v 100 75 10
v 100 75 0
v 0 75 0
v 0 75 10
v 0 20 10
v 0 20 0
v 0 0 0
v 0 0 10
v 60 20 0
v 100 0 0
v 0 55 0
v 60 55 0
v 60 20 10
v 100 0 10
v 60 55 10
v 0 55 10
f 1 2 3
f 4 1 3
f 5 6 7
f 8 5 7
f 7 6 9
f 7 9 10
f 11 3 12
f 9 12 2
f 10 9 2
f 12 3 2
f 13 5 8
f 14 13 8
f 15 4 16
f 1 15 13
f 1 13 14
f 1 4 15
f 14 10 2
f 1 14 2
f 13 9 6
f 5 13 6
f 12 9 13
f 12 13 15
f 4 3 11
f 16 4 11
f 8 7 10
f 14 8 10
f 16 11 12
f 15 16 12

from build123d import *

# Parameters (mm, degrees)
F0_W     = 40
F0_H     = 35
F1_DEPTH = 10
F3_DEPTH = 10


with BuildPart() as f1:
    # F0 (on Top) → F1 (new body)
    with BuildSketch(Plane.XY):
        Polygon((0, 75), (0, 55), (60, 55), (100, 55), (100, 75), align=None)
        with Locations((80, 37.5)):
            Rectangle(F0_W, F0_H)
        Polygon((0, 20), (0, 0), (100, 0), (100, 20), (60, 20), align=None)
    extrude(amount=F1_DEPTH)

    # F2 (on face) → F3 (join, through all)
    with BuildSketch(Plane.XY.offset(10)):
        with BuildLine():
            ThreePointArc((0, 68), (6.9741670742, 72.626784841), (15, 75))
            Line((15, 75), (0, 75))
            Line((0, 75), (0, 68))
        make_face()
        with BuildLine():
            ThreePointArc((15, 0), (6.7778411295, 1.9525167061), (0, 7))
            Line((0, 7), (0, 0))
            Line((0, 0), (15, 0))
        make_face()
    extrude(amount=-F3_DEPTH)


solid = f1.part
